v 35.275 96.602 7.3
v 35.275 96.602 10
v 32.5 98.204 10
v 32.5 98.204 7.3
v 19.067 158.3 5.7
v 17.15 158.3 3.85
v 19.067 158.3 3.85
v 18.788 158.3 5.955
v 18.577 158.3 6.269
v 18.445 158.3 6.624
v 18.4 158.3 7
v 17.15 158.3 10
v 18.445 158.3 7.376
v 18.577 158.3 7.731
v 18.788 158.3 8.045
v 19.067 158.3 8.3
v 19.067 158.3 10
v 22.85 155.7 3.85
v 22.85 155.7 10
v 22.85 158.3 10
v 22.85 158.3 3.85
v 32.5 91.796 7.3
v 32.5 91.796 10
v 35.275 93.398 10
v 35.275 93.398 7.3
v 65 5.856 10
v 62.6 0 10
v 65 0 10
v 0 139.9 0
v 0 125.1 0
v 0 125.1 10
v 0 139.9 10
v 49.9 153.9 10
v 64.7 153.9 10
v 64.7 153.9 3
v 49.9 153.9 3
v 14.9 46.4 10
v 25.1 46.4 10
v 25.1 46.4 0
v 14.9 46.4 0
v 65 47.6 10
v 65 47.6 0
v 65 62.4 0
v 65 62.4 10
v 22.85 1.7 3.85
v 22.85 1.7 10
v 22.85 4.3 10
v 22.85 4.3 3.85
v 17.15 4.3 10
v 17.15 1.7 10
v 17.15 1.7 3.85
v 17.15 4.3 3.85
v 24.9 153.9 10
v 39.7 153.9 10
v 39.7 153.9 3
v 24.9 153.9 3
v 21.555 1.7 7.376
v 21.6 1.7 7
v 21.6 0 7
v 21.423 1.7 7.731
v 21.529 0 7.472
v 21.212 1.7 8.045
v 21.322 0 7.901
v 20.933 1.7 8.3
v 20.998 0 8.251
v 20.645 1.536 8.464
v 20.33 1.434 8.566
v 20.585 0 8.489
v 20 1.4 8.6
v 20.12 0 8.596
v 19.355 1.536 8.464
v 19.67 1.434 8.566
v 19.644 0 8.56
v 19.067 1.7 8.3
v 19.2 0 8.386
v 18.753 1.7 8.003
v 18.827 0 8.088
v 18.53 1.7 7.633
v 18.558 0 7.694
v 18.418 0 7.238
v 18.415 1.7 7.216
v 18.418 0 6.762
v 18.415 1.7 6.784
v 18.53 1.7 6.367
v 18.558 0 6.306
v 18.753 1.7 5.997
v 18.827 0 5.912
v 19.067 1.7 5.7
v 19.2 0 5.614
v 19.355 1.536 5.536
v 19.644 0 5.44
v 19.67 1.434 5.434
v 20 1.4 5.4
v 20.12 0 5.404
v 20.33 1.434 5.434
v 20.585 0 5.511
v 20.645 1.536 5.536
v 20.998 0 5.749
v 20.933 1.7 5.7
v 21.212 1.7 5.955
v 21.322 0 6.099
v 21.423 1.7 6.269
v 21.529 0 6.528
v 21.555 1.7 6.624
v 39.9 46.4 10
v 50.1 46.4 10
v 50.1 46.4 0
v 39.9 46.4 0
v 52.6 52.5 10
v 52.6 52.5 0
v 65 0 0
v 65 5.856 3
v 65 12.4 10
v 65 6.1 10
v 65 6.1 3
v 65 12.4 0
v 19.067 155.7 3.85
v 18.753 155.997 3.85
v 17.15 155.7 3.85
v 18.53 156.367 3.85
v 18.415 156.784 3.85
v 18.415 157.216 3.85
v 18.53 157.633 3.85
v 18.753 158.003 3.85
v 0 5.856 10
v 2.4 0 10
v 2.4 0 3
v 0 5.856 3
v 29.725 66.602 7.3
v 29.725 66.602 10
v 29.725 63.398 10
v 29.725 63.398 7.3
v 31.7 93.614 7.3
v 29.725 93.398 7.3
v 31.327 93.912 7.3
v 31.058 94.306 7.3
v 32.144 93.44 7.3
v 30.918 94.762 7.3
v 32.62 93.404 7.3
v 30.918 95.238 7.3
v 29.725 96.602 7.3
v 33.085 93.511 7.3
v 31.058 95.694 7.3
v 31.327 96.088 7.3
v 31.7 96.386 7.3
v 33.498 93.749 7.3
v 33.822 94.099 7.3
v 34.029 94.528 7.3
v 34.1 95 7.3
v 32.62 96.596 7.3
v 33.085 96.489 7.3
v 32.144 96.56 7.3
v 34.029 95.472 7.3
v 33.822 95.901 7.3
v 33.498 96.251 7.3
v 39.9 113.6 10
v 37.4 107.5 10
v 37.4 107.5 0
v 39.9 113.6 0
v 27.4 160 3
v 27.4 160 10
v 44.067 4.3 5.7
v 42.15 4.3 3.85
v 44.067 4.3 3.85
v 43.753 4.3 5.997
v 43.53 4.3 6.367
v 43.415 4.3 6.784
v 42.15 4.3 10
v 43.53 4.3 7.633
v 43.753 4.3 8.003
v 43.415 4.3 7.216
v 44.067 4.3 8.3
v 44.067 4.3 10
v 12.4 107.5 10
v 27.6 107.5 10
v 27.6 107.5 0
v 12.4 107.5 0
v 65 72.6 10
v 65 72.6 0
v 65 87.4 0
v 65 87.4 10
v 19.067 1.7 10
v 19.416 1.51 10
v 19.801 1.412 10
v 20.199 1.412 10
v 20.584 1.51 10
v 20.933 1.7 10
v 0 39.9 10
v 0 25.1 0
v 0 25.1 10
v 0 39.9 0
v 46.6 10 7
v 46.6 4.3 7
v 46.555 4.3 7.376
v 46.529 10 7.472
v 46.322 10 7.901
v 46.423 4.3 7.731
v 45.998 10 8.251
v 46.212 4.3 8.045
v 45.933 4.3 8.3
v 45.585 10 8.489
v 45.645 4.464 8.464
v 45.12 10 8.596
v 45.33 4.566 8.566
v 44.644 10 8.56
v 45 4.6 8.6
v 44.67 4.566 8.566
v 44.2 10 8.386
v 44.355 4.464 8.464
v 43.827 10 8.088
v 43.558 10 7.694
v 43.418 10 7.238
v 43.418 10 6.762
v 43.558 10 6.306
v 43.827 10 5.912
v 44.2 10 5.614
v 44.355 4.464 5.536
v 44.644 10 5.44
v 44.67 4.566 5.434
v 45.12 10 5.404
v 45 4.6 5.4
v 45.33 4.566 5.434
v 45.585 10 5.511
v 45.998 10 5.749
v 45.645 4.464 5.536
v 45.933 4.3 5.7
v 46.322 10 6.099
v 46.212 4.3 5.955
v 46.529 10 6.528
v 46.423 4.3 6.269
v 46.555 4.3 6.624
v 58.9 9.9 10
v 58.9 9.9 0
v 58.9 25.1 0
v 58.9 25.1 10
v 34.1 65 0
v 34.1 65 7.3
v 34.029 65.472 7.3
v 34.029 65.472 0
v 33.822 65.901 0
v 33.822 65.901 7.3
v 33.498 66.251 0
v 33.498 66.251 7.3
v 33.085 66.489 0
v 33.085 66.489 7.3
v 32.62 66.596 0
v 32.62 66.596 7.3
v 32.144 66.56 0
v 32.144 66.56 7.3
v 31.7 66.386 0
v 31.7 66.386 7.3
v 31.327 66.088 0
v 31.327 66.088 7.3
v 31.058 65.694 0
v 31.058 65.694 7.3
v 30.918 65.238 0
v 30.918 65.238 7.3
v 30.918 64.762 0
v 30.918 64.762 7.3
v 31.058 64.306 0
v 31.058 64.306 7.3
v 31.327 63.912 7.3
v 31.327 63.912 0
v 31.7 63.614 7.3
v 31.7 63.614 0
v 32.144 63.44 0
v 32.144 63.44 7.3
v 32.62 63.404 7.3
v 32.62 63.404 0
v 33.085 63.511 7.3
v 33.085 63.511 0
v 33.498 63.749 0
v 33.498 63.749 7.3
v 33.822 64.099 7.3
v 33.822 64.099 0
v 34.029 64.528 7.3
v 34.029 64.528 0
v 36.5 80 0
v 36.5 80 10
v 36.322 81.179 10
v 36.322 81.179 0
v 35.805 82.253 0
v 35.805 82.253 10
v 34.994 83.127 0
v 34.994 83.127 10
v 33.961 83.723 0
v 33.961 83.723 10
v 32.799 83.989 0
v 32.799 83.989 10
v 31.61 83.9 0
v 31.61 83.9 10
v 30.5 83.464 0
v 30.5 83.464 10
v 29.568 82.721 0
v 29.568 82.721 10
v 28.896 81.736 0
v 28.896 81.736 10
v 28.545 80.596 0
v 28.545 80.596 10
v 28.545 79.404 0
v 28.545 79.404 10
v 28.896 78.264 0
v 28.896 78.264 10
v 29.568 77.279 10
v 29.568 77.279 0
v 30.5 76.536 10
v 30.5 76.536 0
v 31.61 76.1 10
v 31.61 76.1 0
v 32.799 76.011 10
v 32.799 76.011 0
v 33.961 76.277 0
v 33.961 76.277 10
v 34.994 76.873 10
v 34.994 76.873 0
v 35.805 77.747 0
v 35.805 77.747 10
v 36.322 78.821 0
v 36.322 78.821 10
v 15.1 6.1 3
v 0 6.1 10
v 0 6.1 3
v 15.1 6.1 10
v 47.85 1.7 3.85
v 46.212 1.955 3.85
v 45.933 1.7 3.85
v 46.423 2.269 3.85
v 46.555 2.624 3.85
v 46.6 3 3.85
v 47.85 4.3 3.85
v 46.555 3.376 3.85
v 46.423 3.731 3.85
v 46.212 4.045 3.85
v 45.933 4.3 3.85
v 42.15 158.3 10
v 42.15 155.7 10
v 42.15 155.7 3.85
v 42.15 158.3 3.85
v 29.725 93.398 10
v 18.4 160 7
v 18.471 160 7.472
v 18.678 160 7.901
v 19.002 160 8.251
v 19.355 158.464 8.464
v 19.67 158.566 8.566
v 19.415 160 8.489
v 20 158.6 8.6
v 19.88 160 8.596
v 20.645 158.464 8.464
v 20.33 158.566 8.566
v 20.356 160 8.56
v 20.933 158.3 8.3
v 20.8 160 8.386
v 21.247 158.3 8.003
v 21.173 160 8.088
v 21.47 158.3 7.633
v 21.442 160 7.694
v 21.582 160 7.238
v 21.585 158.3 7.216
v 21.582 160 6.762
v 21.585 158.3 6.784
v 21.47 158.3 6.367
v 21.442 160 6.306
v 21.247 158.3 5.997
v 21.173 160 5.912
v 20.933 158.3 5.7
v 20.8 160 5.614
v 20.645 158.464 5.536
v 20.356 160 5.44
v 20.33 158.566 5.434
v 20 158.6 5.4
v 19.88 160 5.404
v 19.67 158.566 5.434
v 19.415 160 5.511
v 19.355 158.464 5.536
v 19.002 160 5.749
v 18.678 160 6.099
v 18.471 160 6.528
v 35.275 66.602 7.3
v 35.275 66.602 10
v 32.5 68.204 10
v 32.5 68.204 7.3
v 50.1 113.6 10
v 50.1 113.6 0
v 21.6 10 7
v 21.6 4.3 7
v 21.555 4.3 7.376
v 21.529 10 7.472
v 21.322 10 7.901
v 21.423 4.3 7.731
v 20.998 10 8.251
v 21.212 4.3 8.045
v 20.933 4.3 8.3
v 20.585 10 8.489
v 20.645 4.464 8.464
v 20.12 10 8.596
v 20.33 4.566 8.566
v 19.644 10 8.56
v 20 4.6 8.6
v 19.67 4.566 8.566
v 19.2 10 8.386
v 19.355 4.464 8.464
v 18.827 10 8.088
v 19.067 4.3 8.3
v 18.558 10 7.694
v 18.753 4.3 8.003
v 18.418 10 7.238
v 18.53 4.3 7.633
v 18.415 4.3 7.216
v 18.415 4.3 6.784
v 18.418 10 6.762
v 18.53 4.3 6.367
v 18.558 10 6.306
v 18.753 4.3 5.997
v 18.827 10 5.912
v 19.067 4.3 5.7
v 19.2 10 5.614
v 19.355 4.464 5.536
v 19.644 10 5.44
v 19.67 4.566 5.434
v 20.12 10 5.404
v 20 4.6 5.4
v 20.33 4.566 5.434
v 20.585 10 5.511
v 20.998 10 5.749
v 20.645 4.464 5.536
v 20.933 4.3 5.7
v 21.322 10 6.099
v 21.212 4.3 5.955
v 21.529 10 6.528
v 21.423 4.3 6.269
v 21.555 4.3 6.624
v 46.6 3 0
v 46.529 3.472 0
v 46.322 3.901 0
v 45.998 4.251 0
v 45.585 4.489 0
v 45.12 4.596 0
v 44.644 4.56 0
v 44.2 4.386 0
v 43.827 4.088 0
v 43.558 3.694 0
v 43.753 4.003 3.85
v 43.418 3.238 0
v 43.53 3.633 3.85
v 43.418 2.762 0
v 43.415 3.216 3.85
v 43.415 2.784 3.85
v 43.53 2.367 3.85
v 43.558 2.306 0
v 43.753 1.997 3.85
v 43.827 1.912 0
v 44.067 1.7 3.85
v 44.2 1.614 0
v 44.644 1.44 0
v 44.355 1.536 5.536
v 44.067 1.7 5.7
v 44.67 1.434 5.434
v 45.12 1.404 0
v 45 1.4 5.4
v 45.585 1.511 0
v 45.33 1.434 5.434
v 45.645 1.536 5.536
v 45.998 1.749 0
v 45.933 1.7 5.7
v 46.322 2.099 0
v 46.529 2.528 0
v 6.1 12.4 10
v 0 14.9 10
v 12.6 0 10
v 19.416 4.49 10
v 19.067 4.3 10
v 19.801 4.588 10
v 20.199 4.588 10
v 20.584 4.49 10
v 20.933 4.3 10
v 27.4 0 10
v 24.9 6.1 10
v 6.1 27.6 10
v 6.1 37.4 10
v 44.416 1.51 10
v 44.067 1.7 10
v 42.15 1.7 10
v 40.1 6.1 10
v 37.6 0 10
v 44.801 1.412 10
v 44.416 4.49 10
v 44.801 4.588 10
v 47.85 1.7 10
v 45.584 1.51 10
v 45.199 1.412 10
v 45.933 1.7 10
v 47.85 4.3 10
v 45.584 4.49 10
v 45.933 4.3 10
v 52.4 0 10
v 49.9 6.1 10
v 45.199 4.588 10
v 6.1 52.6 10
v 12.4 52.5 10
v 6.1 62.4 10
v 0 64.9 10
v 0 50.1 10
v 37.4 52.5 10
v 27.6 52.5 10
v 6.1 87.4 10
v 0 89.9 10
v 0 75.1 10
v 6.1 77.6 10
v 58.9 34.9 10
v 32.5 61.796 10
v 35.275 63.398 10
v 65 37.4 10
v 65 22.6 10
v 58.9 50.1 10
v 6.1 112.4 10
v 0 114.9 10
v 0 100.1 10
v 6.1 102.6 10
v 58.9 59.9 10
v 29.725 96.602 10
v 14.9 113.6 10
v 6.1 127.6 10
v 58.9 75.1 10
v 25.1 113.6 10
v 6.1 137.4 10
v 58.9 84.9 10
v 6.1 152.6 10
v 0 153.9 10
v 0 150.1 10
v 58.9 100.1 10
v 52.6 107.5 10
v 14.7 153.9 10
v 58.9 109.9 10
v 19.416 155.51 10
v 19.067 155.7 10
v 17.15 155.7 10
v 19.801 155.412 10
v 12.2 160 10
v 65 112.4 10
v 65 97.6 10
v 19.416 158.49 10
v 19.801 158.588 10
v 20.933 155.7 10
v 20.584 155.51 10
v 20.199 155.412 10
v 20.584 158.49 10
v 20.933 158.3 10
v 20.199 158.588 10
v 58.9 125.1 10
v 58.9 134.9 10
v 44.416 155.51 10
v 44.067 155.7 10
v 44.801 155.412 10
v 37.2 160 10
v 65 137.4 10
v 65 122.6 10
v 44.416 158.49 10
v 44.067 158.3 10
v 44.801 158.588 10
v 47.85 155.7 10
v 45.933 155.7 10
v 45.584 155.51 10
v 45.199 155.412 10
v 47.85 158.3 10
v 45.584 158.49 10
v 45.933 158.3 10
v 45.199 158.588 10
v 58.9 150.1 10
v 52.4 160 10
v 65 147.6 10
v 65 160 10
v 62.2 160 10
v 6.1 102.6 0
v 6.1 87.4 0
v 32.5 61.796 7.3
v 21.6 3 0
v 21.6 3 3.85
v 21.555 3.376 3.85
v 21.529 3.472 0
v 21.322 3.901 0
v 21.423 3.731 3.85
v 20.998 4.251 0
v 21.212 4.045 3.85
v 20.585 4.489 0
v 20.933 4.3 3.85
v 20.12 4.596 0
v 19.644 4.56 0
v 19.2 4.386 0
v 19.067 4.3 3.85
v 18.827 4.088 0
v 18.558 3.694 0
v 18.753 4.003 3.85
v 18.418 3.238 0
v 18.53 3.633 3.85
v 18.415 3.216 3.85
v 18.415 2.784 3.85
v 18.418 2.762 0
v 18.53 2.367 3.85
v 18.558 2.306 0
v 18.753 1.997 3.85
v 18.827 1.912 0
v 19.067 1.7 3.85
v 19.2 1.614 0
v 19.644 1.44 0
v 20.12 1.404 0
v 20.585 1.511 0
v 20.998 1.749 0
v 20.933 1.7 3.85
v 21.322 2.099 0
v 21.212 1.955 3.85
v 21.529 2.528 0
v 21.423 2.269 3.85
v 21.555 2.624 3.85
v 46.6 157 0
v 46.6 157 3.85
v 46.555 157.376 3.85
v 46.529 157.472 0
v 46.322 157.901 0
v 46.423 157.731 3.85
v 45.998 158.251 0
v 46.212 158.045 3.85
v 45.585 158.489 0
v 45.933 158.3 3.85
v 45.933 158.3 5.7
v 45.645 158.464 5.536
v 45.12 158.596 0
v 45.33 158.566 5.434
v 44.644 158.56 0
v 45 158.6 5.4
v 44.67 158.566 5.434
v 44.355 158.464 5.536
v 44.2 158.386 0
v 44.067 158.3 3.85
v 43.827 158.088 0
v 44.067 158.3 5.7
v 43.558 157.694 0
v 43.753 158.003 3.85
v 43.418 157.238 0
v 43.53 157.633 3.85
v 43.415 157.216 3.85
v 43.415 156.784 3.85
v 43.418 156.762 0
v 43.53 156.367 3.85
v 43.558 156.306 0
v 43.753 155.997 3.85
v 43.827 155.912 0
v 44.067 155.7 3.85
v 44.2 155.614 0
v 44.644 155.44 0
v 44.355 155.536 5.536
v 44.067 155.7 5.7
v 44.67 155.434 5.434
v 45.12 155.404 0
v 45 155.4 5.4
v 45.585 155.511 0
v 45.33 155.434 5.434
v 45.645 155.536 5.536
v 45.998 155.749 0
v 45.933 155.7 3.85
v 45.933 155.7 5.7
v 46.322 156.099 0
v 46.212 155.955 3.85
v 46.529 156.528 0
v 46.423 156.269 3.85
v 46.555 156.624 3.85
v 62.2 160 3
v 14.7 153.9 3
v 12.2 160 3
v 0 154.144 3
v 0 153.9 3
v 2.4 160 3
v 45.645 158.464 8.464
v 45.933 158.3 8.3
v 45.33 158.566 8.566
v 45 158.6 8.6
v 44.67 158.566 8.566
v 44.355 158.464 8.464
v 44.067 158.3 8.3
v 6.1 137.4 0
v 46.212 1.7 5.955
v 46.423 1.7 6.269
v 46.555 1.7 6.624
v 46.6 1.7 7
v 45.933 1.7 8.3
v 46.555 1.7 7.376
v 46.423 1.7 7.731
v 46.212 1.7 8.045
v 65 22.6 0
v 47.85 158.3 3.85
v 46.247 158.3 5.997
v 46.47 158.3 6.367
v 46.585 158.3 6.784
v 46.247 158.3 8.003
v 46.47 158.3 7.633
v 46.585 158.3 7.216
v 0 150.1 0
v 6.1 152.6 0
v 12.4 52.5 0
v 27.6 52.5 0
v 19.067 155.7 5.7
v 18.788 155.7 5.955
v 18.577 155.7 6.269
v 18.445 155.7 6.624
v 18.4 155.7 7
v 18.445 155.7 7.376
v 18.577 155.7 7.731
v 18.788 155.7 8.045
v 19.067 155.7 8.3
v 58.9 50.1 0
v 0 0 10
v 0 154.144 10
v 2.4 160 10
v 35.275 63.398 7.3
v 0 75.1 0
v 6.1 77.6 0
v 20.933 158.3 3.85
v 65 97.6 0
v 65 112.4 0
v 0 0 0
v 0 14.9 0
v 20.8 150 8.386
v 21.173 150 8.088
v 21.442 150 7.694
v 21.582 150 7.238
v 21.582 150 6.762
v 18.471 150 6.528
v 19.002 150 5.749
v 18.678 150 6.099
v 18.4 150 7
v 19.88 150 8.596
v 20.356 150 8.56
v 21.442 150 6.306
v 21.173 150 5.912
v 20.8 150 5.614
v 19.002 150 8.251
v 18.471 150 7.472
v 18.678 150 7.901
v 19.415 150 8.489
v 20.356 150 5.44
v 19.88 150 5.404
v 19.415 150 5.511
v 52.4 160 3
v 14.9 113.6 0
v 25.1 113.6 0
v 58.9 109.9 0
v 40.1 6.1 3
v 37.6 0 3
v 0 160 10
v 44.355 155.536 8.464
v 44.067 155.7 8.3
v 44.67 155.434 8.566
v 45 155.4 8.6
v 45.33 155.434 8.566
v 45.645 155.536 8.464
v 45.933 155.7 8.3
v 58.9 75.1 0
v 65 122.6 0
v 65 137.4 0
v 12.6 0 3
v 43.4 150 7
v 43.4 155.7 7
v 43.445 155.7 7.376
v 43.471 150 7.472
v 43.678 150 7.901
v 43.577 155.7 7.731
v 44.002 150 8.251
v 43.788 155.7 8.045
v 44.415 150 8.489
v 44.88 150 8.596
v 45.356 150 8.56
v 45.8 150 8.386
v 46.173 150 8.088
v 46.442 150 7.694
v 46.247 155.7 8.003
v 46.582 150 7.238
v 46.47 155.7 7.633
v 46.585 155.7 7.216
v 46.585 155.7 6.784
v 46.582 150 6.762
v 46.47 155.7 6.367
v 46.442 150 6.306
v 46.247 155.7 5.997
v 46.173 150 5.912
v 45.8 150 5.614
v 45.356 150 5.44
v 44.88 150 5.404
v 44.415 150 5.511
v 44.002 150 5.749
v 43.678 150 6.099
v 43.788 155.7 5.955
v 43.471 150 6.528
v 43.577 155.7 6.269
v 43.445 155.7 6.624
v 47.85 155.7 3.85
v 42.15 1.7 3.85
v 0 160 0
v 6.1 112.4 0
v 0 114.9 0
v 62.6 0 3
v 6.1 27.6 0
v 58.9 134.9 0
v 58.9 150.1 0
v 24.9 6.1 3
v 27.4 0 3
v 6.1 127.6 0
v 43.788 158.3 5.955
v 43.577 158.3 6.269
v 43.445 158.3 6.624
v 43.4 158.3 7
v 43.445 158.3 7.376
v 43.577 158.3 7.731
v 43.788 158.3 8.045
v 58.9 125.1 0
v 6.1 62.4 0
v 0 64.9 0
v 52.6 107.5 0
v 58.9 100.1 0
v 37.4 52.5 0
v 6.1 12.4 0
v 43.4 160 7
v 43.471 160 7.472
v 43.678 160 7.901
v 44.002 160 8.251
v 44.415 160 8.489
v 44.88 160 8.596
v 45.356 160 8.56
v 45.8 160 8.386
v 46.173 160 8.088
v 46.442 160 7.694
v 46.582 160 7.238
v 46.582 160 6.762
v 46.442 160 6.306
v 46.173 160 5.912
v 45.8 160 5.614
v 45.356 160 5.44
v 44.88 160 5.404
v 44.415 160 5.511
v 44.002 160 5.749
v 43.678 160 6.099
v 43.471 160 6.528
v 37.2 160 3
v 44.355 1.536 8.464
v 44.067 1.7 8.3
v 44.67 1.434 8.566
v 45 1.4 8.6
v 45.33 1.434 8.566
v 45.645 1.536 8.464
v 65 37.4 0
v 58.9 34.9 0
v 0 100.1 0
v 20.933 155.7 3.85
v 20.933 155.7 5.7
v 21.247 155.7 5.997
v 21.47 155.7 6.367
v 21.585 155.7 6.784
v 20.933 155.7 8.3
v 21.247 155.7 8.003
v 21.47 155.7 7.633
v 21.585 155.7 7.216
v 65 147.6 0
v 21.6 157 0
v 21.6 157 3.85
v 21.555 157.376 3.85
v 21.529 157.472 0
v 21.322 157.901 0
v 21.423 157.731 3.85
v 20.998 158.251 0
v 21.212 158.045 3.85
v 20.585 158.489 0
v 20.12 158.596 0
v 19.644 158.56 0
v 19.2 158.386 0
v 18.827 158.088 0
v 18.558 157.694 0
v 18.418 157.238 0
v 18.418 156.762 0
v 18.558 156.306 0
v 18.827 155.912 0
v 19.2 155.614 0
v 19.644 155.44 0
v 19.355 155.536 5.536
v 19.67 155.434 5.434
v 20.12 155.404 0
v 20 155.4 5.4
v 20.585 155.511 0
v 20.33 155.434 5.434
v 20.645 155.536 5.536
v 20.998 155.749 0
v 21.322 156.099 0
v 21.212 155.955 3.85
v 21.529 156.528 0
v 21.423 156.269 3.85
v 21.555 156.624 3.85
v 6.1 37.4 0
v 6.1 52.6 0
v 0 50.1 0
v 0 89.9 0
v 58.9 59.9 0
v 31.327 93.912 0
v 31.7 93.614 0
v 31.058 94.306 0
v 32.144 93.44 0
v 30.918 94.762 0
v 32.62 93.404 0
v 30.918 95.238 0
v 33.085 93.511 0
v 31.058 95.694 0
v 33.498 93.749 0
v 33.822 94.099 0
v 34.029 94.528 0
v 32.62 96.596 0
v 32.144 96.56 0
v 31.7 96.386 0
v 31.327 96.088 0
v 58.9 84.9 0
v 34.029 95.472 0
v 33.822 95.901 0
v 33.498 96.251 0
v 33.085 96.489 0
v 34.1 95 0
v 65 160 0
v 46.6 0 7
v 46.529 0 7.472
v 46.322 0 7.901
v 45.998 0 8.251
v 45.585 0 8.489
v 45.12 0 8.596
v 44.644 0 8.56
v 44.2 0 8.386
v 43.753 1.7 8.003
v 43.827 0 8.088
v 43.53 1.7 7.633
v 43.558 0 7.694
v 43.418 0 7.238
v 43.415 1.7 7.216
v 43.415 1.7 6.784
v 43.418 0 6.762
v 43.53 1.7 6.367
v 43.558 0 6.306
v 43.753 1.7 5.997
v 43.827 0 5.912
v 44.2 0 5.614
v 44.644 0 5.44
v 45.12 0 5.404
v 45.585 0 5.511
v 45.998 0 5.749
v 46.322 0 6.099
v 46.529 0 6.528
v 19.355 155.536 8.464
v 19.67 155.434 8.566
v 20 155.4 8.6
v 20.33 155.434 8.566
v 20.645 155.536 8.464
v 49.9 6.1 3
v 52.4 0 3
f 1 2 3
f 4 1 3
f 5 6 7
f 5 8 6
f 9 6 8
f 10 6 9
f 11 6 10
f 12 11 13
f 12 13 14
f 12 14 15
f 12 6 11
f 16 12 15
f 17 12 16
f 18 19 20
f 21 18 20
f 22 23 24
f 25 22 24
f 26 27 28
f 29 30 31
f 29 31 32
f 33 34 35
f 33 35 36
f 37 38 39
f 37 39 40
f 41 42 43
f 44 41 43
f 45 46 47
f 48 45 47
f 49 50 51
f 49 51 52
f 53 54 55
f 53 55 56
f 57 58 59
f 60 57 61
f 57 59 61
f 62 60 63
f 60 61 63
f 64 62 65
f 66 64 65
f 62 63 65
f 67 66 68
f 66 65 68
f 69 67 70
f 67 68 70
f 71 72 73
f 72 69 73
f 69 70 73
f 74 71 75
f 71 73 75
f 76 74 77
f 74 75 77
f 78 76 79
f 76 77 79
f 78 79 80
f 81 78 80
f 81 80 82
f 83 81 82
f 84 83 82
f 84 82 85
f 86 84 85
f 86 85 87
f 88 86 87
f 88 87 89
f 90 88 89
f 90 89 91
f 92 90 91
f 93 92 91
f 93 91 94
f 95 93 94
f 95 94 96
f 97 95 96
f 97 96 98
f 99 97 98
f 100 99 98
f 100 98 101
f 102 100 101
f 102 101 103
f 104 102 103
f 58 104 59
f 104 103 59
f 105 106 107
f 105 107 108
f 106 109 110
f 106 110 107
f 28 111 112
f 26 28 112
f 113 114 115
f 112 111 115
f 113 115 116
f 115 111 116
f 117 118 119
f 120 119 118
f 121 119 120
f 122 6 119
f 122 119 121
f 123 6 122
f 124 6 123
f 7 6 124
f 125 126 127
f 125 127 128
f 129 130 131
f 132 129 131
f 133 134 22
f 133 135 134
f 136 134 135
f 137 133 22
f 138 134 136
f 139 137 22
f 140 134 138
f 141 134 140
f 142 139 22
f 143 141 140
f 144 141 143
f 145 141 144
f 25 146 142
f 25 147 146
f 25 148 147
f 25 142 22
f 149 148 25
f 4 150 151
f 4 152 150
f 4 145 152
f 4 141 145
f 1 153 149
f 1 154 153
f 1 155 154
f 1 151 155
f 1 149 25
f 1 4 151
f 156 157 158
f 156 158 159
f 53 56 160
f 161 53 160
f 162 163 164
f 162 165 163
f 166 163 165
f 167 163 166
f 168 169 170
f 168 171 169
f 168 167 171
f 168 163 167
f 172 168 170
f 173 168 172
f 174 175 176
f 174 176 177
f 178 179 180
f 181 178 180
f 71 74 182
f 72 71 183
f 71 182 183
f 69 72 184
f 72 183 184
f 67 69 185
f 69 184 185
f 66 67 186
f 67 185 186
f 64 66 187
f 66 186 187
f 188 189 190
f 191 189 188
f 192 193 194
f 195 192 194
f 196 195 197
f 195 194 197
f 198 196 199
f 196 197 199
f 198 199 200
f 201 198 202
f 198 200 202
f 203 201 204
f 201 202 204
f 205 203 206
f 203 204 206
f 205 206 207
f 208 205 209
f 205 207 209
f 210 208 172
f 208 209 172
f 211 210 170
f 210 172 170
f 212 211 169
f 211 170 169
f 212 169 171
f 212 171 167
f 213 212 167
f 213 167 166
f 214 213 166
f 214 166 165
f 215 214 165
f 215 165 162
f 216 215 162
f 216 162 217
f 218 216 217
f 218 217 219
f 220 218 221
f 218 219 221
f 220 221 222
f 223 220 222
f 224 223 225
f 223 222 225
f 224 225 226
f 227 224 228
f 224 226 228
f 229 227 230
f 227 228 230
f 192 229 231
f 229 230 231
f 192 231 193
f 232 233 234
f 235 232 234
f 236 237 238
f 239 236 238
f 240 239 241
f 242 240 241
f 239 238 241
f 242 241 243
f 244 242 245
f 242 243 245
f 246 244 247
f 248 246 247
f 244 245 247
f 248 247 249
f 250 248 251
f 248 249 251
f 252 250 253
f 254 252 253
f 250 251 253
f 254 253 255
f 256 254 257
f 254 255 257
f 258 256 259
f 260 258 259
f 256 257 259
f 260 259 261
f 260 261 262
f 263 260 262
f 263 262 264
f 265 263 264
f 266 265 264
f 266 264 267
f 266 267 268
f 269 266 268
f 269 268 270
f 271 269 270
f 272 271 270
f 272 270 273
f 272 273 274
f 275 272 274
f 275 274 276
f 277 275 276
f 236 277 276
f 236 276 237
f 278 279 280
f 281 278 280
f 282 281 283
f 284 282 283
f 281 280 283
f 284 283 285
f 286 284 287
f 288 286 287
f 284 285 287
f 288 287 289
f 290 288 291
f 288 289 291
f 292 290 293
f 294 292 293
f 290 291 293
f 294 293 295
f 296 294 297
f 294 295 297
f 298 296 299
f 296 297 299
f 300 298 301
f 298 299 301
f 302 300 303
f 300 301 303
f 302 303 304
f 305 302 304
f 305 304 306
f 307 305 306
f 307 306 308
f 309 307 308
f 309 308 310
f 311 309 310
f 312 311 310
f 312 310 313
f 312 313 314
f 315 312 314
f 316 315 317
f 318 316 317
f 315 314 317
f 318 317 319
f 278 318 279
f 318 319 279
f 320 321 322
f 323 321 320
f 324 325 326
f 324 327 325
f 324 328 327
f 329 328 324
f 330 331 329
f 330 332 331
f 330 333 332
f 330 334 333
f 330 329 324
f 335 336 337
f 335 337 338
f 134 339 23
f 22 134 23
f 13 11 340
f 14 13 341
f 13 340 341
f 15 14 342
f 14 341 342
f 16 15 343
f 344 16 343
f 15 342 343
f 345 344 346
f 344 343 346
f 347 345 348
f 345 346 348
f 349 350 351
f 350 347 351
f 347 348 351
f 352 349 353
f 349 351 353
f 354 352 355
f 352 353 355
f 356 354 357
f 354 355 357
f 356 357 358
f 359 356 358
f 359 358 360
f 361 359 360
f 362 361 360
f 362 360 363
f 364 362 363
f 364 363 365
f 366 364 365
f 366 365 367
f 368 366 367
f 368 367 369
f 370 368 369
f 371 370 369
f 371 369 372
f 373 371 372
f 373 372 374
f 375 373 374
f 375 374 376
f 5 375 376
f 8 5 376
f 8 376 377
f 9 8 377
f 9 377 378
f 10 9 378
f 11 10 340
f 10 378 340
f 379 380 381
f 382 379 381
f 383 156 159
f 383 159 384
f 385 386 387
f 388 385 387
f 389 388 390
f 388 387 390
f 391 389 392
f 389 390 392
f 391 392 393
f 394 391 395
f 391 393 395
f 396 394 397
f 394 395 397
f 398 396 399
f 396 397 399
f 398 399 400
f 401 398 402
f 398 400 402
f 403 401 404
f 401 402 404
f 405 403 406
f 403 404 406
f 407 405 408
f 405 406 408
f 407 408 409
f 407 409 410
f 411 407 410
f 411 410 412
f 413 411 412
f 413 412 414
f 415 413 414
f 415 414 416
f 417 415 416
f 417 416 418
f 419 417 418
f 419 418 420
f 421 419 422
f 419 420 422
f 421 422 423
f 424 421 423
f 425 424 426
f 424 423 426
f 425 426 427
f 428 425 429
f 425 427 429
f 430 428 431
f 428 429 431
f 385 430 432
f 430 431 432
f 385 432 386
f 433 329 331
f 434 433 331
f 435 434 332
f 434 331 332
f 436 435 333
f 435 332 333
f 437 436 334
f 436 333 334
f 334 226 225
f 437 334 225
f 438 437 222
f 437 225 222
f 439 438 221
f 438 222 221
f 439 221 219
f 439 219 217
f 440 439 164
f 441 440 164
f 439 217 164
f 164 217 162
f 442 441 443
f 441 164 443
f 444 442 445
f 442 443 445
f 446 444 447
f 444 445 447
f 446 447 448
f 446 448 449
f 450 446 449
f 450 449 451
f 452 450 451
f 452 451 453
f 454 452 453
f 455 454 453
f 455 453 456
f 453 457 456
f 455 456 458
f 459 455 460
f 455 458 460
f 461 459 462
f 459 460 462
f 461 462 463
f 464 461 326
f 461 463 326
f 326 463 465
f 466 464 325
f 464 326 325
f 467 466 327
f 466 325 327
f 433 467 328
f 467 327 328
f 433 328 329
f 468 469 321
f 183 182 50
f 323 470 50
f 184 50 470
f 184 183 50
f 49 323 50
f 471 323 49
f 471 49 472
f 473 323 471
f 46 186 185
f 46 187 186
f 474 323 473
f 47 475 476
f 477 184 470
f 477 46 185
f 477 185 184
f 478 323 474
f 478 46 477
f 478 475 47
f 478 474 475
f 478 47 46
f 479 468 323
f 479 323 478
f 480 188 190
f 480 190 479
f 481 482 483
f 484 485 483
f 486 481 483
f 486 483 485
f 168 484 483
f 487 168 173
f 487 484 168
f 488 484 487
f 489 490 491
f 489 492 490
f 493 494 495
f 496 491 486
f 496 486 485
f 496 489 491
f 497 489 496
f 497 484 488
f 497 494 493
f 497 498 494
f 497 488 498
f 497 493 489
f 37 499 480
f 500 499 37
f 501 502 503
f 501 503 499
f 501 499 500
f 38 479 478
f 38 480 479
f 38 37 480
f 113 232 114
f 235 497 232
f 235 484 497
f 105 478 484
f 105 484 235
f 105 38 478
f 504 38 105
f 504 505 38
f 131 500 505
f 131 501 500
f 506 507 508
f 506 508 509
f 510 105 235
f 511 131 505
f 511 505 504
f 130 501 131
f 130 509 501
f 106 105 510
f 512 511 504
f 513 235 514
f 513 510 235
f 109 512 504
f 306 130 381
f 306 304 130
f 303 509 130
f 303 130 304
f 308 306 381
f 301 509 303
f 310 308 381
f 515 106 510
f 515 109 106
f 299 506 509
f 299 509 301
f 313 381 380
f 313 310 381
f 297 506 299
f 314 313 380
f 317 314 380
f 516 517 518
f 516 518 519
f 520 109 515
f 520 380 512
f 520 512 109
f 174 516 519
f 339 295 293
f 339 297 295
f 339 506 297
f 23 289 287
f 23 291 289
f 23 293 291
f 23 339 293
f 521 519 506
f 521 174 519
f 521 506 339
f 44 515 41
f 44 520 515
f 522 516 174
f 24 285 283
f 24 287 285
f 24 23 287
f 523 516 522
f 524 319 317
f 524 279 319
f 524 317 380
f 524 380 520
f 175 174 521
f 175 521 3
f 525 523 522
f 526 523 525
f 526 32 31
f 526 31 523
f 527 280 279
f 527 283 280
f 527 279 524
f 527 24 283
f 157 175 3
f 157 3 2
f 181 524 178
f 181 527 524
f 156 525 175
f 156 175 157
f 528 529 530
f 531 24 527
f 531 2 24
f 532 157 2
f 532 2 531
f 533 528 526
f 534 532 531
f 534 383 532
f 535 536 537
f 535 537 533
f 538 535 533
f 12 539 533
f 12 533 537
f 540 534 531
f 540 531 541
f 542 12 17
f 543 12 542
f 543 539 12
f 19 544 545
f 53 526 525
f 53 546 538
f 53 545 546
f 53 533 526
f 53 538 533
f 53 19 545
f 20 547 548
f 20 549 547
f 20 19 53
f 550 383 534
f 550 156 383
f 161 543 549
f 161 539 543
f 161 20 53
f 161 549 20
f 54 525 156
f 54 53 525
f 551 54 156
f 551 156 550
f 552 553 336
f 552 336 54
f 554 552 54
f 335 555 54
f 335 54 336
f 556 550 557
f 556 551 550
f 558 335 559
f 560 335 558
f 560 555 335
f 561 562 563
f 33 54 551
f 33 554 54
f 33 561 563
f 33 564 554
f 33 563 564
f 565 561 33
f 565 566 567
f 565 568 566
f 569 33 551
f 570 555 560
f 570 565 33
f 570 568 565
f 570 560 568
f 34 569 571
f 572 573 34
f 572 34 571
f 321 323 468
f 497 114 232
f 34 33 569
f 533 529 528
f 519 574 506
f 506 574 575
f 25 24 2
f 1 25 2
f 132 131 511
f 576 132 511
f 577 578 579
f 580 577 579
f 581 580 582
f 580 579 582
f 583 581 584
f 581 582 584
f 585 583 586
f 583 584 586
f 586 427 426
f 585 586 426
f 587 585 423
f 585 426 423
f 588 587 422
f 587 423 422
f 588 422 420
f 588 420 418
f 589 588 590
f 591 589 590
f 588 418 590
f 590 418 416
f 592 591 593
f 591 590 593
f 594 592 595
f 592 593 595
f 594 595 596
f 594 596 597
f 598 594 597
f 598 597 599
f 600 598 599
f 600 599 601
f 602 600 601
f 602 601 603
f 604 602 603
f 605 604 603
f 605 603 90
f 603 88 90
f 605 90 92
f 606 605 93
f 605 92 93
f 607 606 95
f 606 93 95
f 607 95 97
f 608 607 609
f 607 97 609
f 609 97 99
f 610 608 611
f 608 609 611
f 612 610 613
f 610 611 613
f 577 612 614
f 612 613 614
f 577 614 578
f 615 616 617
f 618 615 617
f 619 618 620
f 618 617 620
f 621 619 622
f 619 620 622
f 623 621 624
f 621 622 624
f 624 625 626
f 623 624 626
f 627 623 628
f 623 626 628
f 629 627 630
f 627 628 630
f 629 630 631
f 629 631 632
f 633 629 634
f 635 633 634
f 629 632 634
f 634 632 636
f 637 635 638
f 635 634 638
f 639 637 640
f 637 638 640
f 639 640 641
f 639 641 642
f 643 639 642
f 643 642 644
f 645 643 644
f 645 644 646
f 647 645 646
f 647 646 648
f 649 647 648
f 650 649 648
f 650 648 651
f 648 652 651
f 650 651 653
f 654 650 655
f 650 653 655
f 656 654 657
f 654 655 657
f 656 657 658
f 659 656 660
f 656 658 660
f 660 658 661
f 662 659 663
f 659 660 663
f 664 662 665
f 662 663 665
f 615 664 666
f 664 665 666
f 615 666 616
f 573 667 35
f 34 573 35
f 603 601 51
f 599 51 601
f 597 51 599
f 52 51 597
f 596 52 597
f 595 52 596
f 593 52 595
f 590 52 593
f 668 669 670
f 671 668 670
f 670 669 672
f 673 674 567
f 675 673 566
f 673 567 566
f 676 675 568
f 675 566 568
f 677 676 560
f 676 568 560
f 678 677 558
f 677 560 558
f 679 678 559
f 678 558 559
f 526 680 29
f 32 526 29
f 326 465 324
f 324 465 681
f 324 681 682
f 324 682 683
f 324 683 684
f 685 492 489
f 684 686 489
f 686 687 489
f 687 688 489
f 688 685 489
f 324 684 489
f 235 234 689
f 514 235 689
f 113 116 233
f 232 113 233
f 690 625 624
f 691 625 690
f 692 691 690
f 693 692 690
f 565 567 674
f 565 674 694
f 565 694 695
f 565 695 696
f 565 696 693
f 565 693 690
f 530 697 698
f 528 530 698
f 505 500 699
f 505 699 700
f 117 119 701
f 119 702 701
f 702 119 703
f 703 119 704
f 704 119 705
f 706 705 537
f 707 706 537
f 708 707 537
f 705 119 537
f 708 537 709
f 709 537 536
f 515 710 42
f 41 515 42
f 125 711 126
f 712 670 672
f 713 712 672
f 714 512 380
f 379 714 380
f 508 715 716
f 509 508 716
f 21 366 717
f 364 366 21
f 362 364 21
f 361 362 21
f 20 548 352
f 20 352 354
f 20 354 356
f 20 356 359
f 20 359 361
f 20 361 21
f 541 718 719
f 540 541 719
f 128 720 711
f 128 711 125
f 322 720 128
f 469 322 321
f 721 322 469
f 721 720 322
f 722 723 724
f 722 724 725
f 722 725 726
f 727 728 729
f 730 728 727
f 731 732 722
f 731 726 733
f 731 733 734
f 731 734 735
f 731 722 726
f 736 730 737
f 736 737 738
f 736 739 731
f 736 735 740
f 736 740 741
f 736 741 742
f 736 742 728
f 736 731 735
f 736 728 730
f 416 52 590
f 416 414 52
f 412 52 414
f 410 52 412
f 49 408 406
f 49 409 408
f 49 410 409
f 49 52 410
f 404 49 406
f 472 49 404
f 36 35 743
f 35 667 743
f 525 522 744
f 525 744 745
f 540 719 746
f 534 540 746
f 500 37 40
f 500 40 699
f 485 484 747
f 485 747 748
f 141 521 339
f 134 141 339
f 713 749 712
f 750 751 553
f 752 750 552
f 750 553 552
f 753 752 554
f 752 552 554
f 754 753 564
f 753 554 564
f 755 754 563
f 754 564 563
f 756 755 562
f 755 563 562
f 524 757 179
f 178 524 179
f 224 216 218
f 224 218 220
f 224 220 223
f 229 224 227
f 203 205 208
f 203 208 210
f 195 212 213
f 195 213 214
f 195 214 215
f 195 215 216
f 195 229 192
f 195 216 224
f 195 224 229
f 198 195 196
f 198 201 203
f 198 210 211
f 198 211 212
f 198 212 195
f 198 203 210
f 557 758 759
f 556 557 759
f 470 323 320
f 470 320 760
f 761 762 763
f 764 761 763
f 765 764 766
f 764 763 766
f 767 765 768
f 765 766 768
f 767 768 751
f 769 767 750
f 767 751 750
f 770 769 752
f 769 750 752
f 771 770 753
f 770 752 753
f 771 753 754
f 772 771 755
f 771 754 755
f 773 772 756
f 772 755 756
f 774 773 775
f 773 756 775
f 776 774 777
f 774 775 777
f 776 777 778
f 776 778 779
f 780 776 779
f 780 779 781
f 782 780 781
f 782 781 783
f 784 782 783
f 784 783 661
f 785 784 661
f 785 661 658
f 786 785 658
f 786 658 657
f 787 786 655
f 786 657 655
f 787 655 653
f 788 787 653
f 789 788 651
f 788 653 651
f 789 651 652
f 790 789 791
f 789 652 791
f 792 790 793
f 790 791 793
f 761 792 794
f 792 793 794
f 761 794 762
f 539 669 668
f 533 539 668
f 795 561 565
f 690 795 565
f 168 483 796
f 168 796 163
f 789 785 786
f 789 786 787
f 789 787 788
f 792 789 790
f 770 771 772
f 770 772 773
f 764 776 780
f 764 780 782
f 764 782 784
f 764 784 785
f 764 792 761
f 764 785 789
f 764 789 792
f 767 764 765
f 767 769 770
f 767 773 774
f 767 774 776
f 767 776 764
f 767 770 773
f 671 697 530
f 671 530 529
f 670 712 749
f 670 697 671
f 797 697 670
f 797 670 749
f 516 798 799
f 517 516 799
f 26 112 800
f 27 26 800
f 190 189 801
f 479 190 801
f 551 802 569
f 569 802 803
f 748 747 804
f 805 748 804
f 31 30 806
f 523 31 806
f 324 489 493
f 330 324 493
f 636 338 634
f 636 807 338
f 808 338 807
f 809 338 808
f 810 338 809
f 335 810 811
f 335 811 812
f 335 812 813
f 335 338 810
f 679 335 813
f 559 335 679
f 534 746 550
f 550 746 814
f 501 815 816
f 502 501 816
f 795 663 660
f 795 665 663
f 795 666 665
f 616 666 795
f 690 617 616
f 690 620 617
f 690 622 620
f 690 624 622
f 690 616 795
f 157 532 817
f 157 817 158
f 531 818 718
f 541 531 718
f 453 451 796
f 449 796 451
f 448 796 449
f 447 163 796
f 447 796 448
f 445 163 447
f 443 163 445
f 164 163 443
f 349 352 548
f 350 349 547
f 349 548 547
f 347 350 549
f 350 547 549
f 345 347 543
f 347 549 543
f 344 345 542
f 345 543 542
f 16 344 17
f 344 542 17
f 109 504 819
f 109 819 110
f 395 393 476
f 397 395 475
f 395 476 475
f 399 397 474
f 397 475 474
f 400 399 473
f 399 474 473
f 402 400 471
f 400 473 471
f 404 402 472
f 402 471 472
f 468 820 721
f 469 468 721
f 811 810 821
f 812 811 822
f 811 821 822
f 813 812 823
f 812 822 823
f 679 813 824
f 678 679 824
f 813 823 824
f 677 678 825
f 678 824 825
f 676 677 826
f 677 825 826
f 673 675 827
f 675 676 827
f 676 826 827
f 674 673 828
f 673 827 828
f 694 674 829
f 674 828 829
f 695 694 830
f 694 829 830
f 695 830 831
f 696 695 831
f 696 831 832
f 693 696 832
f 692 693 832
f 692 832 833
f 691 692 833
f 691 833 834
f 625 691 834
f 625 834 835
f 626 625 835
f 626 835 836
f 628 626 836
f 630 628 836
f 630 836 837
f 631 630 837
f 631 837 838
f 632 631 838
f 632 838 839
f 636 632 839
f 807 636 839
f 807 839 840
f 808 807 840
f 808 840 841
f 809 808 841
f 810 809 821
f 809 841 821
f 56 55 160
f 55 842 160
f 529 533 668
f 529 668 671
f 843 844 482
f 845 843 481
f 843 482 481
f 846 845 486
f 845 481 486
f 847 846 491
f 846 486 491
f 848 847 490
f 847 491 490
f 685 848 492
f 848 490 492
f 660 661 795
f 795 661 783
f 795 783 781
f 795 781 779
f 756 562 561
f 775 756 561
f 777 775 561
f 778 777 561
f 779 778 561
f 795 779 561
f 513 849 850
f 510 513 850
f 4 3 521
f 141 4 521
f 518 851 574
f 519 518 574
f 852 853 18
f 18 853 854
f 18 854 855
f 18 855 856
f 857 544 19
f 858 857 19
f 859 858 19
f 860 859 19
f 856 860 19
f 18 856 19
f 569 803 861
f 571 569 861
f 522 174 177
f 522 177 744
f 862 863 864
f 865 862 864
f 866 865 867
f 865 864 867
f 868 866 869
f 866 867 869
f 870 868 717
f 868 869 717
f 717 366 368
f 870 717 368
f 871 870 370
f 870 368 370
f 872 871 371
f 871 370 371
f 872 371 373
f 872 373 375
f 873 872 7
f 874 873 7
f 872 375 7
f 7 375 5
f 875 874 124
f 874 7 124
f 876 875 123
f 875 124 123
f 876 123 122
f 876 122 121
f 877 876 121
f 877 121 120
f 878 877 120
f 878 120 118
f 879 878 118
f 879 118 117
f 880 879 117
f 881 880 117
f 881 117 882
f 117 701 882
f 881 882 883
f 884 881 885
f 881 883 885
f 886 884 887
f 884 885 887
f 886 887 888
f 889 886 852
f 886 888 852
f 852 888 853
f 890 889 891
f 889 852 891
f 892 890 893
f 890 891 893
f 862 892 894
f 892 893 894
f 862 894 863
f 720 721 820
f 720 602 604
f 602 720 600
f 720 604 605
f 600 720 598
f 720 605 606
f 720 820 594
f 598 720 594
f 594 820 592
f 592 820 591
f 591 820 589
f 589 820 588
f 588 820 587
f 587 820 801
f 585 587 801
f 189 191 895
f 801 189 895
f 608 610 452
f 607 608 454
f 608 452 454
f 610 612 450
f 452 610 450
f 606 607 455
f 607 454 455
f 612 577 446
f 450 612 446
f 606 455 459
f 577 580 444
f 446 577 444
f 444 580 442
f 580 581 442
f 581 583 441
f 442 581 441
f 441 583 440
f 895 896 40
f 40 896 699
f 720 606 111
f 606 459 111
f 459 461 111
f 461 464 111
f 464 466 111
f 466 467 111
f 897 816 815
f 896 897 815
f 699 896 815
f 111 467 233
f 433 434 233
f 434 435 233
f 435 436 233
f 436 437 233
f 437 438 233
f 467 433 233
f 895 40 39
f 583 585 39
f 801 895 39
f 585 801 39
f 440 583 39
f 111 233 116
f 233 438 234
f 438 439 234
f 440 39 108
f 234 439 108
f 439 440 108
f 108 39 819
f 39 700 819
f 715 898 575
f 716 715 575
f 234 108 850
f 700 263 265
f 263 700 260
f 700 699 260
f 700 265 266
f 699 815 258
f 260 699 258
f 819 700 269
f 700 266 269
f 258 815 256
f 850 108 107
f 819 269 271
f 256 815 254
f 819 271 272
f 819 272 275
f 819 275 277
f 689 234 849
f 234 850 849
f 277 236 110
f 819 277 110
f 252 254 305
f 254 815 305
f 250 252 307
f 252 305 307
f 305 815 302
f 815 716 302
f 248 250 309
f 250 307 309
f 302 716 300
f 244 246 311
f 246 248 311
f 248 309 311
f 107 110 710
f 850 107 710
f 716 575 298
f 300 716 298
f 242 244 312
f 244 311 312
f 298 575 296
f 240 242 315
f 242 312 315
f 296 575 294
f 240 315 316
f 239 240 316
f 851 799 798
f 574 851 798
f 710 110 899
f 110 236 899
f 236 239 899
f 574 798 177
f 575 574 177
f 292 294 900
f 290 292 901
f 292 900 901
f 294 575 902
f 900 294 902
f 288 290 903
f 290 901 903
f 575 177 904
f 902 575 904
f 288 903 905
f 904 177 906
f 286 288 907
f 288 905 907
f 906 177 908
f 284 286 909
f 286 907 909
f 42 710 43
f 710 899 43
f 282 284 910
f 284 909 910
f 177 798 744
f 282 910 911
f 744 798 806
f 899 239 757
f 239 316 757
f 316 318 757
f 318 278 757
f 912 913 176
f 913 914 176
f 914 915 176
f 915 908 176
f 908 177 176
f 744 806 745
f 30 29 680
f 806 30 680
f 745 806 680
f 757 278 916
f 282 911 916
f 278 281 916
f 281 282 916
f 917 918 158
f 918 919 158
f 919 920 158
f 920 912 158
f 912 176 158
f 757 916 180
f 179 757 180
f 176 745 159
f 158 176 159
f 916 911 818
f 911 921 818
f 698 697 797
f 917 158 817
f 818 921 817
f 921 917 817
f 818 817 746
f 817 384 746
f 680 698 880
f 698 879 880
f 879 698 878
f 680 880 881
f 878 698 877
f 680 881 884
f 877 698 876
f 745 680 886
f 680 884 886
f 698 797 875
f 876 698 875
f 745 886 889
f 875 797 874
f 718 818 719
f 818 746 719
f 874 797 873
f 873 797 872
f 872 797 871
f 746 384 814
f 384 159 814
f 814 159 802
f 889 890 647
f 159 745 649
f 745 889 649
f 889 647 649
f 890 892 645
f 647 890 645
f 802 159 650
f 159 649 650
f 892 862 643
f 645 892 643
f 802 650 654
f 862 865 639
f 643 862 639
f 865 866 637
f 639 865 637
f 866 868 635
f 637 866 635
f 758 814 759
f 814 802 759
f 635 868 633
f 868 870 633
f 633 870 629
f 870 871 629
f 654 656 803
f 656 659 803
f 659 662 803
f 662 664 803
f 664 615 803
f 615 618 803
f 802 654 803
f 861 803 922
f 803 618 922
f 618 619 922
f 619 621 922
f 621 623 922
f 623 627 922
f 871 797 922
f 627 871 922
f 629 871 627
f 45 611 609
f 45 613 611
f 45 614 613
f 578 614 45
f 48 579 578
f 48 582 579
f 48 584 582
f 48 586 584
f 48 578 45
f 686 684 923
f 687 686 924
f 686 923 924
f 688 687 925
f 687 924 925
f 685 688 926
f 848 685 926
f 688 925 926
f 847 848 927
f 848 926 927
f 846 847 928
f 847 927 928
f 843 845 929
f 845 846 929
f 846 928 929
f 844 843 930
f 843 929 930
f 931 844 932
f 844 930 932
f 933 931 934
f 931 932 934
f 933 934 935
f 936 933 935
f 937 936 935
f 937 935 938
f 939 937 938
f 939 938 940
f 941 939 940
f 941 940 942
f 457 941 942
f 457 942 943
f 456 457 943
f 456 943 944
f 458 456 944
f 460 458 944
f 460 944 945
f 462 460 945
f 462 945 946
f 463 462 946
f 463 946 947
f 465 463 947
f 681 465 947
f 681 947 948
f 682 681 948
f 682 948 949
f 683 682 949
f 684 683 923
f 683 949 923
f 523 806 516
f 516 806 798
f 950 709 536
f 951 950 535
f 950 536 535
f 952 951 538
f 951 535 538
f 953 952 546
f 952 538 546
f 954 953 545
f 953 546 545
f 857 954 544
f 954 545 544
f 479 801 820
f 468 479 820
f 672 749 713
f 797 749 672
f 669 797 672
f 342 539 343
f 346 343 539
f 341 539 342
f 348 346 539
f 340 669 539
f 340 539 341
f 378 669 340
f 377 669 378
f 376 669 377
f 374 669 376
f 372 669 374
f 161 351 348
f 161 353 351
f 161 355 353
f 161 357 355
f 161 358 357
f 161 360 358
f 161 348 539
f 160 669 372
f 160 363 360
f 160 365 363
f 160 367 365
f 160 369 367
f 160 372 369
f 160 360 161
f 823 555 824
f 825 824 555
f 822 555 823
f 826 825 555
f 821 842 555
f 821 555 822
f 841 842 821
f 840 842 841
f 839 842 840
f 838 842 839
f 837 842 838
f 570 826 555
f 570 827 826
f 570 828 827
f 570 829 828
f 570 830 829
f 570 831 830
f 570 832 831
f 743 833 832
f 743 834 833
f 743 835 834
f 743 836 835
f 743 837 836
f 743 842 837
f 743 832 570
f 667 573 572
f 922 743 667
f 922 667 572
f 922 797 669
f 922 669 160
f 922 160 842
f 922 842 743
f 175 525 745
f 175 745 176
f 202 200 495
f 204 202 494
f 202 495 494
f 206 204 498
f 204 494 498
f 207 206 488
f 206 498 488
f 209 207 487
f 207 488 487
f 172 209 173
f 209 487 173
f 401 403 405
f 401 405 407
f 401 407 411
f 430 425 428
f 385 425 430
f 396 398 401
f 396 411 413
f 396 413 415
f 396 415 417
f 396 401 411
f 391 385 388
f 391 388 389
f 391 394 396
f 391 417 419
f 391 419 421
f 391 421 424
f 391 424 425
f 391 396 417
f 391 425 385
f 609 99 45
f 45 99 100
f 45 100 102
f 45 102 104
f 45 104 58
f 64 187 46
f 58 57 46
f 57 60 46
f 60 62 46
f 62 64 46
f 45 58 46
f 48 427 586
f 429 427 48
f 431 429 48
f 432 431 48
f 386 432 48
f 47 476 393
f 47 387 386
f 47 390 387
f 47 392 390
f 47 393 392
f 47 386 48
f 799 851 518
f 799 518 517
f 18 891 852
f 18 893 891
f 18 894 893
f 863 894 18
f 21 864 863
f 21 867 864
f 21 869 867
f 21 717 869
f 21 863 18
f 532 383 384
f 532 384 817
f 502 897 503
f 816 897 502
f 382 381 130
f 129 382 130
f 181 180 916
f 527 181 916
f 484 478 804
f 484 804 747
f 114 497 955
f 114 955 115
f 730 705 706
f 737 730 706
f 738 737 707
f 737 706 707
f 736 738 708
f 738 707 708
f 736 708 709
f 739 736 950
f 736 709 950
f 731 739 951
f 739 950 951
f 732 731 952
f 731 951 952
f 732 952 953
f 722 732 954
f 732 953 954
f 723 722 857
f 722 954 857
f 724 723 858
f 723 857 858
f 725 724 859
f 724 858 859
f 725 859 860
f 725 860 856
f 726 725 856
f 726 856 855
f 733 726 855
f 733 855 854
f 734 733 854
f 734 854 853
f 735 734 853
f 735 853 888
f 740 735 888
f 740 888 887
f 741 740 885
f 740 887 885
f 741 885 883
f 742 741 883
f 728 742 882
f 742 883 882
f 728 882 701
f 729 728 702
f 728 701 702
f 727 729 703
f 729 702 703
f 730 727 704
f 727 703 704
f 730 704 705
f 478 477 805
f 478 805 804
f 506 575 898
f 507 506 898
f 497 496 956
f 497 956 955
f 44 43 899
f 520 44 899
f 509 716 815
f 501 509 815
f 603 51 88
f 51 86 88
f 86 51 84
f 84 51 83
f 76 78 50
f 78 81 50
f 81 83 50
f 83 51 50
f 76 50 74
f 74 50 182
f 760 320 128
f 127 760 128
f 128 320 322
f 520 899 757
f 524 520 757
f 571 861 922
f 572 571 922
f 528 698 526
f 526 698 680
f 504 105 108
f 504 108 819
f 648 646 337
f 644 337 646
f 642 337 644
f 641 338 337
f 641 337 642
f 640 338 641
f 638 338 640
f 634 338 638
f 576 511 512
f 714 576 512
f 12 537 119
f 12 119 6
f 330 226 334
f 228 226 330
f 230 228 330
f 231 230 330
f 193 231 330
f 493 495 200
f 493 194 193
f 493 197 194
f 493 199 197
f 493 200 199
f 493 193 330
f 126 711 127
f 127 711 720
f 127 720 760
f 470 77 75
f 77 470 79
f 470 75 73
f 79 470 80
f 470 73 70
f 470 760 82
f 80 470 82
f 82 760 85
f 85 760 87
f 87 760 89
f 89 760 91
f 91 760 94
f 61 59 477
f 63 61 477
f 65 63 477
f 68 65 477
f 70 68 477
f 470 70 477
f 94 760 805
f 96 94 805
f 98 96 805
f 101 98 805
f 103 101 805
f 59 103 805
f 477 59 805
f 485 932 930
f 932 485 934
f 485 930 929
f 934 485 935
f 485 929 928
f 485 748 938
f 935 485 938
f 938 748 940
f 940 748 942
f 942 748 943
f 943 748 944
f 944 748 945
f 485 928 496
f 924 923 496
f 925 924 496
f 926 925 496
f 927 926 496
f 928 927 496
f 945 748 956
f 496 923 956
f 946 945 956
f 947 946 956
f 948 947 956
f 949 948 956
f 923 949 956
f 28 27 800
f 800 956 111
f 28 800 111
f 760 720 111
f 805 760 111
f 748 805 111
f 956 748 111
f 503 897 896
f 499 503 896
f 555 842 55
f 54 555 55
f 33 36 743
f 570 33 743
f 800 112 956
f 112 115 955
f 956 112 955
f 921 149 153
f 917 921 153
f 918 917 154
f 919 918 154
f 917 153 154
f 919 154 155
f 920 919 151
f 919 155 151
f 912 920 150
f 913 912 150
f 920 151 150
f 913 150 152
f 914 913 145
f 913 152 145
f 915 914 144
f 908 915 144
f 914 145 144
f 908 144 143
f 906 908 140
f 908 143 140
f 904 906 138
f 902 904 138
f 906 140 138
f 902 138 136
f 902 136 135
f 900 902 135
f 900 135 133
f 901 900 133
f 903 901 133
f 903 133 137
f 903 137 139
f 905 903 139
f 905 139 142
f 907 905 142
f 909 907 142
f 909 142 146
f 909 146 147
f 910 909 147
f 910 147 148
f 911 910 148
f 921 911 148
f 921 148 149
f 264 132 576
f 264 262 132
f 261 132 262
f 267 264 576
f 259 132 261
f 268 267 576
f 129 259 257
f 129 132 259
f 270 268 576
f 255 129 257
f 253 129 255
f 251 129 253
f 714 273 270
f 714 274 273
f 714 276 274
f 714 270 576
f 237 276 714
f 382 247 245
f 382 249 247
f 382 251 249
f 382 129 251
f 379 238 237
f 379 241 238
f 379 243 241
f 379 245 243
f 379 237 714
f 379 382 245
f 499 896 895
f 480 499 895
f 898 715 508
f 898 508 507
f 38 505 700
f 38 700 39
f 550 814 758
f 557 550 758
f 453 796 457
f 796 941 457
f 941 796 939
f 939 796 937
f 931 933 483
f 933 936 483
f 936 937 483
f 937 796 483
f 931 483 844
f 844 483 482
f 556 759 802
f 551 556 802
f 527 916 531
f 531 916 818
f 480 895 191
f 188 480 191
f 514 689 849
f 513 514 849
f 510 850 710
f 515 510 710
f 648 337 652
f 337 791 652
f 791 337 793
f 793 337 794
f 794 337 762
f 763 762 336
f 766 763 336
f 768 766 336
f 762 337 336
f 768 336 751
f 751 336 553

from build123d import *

# Parameters (mm, degrees)
SKETCH_W        = 65
SKETCH_H        = 160
PAD_DEPTH       = 10
POCKET_DEPTH    = 7
SKETCH003_R     = 1.6
POCKET002_DEPTH = 10
POCKET003_DEPTH = 10
SKETCH005_R     = 1.6
POCKET004_DEPTH = 10
SKETCH006_R     = 1.6
POCKET005_DEPTH = 10
SKETCH007_W     = 5.7
SKETCH007_H     = 2.6
POCKET006_DEPTH = 6.15
POCKET007_DEPTH = 11
SKETCH010_R     = 4
SKETCH010_R_2   = 1.6
POCKET008_DEPTH = 10
POCKET009_DEPTH = 2.7


with BuildPart() as part:
    # Sketch → Pad (new body)
    with BuildSketch(Plane.XY):
        with Locations((32.5, 80)):
            Rectangle(SKETCH_W, SKETCH_H)
    extrude(amount=PAD_DEPTH)

    # Sketch001 (on Face6 of Pad) → Pocket (cut)
    with BuildSketch(Plane.XY.offset(10)):
        Polygon((24.9, 6.1), (40.1, 6.1), (37.6, 0), (27.4, 0), align=None)
        Polygon((49.9, 6.1), (65.1, 6.1), (62.6, 0), (52.4, 0), align=None)
        Polygon((-0.1, 6.1), (15.1, 6.1), (12.6, 0), (2.4, 0), align=None)
        Polygon((39.7, 153.9), (24.9, 153.9), (27.4, 160), (37.2, 160), align=None)
        Polygon((14.7, 153.9), (-0.1, 153.9), (2.4, 160), (12.2, 160), align=None)
        Polygon((64.7, 153.9), (49.9, 153.9), (52.4, 160), (62.2, 160), align=None)
    extrude(amount=-POCKET_DEPTH, mode=Mode.SUBTRACT)

    # Sketch003 → Pocket002 (cut)
    with BuildSketch(Plane.XY.offset(10)):
        with Locations((20, 157)):
            Circle(SKETCH003_R)
        with Locations((45, 157)):
            Circle(SKETCH003_R)
        with Locations((20, 3)):
            Circle(SKETCH003_R)
        with Locations((45, 3)):
            Circle(SKETCH003_R)
    extrude(amount=-POCKET002_DEPTH, mode=Mode.SUBTRACT)

    # Sketch004 (on Face2 of Pocket002) → Pocket003 (cut)
    with BuildSketch(Plane(origin=(0, 0, 0), x_dir=(1, 0, 0), z_dir=(0, 0, -1))):
        Polygon((58.9, -84.9), (58.9, -100.1), (65, -97.6), (65, -87.4), align=None)
        Polygon((58.9, -59.9), (58.9, -75.1), (65, -72.6), (65, -62.4), align=None)
        Polygon((58.9, -34.9), (58.9, -50.1), (65, -47.6), (65, -37.4), align=None)
        Polygon((58.9, -9.9), (58.9, -25.1), (65, -22.6), (65, -12.4), align=None)
        Polygon((58.9, -134.9), (58.9, -150.1), (65, -147.6), (65, -137.4), align=None)
        Polygon((58.9, -109.9), (58.9, -125.1), (65, -122.6), (65, -112.4), align=None)
        Polygon((0, -14.9), (0, -25.1), (6.1, -27.6), (6.1, -12.4), align=None)
        Polygon((0, -39.9), (0, -50.1), (6.1, -52.6), (6.1, -37.4), align=None)
        Polygon((0, -64.9), (0, -75.1), (6.1, -77.6), (6.1, -62.4), align=None)
        Polygon((0, -89.9), (0, -100.1), (6.1, -102.6), (6.1, -87.4), align=None)
        Polygon((0, -114.9), (0, -125.1), (6.1, -127.6), (6.1, -112.4), align=None)
        Polygon((0, -139.9), (0, -150.1), (6.1, -152.6), (6.1, -137.4), align=None)
    extrude(amount=-POCKET003_DEPTH, mode=Mode.SUBTRACT)

    # Sketch005 (on Face40 of Pocket003) → Pocket004 (cut)
    with BuildSketch(Plane.XZ):
        with Locations((20, 7)):
            Circle(SKETCH005_R)
        with Locations((45, 7)):
            Circle(SKETCH005_R)
    extrude(amount=-POCKET004_DEPTH, mode=Mode.SUBTRACT)

    # Sketch006 (on Face1 of Pocket004) → Pocket005 (cut)
    with BuildSketch(Plane(origin=(0, 160, 0), x_dir=(-1, 0, 0), z_dir=(0, 1, 0))):
        with Locations((-45, 7)):
            Circle(SKETCH006_R)
        with Locations((-20, 7)):
            Circle(SKETCH006_R)
    extrude(amount=-POCKET005_DEPTH, mode=Mode.SUBTRACT)

    # Sketch007 (on Face6 of Pocket005) → Pocket006 (cut)
    with BuildSketch(Plane.XY.offset(10)):
        with Locations((20, 157)):
            Rectangle(SKETCH007_W, SKETCH007_H)
        with Locations((45, 157)):
            Rectangle(SKETCH007_W, SKETCH007_H)
        with Locations((20, 3)):
            Rectangle(SKETCH007_W, SKETCH007_H)
        with Locations((45, 3)):
            Rectangle(SKETCH007_W, SKETCH007_H)
    extrude(amount=-POCKET006_DEPTH, mode=Mode.SUBTRACT)

    # Sketch009 (on Face6 of Pocket006) → Pocket007 (cut)
    with BuildSketch(Plane.XY.offset(10)):
        Polygon((14.9, 113.6), (25.1, 113.6), (27.6, 107.5), (12.4, 107.5), align=None)
        Polygon((39.9, 113.6), (50.1, 113.6), (52.6, 107.5), (37.4, 107.5), align=None)
        Polygon((12.4, 52.5), (27.6, 52.5), (25.1, 46.4), (14.9, 46.4), align=None)
        Polygon((37.4, 52.5), (52.6, 52.5), (50.1, 46.4), (39.9, 46.4), align=None)
    extrude(amount=-POCKET007_DEPTH, mode=Mode.SUBTRACT)

    # Sketch010 (on Face6 of Pocket007) → Pocket008 (cut)
    with BuildSketch(Plane.XY.offset(10)):
        with Locations((32.5, 80)):
            Circle(SKETCH010_R)
        with Locations((32.5, 95)):
            Circle(SKETCH010_R_2)
        with Locations((32.5, 65)):
            Circle(SKETCH010_R_2)
    extrude(amount=-POCKET008_DEPTH, mode=Mode.SUBTRACT)

    # Sketch011 (on Face6 of Pocket008) → Pocket009 (cut)
    with BuildSketch(Plane.XY.offset(10)):
        Polygon((35.275, 93.397853), (35.275, 96.602147), (32.5, 98.204294), (29.725, 96.602147), (29.725, 93.397853), (32.5, 91.795706), align=None)
        Polygon((35.275, 63.397853), (35.275, 66.602147), (32.5, 68.204294), (29.725, 66.602147), (29.725, 63.397853), (32.5, 61.795706), align=None)
    extrude(amount=-POCKET009_DEPTH, mode=Mode.SUBTRACT)


solid = part.part
